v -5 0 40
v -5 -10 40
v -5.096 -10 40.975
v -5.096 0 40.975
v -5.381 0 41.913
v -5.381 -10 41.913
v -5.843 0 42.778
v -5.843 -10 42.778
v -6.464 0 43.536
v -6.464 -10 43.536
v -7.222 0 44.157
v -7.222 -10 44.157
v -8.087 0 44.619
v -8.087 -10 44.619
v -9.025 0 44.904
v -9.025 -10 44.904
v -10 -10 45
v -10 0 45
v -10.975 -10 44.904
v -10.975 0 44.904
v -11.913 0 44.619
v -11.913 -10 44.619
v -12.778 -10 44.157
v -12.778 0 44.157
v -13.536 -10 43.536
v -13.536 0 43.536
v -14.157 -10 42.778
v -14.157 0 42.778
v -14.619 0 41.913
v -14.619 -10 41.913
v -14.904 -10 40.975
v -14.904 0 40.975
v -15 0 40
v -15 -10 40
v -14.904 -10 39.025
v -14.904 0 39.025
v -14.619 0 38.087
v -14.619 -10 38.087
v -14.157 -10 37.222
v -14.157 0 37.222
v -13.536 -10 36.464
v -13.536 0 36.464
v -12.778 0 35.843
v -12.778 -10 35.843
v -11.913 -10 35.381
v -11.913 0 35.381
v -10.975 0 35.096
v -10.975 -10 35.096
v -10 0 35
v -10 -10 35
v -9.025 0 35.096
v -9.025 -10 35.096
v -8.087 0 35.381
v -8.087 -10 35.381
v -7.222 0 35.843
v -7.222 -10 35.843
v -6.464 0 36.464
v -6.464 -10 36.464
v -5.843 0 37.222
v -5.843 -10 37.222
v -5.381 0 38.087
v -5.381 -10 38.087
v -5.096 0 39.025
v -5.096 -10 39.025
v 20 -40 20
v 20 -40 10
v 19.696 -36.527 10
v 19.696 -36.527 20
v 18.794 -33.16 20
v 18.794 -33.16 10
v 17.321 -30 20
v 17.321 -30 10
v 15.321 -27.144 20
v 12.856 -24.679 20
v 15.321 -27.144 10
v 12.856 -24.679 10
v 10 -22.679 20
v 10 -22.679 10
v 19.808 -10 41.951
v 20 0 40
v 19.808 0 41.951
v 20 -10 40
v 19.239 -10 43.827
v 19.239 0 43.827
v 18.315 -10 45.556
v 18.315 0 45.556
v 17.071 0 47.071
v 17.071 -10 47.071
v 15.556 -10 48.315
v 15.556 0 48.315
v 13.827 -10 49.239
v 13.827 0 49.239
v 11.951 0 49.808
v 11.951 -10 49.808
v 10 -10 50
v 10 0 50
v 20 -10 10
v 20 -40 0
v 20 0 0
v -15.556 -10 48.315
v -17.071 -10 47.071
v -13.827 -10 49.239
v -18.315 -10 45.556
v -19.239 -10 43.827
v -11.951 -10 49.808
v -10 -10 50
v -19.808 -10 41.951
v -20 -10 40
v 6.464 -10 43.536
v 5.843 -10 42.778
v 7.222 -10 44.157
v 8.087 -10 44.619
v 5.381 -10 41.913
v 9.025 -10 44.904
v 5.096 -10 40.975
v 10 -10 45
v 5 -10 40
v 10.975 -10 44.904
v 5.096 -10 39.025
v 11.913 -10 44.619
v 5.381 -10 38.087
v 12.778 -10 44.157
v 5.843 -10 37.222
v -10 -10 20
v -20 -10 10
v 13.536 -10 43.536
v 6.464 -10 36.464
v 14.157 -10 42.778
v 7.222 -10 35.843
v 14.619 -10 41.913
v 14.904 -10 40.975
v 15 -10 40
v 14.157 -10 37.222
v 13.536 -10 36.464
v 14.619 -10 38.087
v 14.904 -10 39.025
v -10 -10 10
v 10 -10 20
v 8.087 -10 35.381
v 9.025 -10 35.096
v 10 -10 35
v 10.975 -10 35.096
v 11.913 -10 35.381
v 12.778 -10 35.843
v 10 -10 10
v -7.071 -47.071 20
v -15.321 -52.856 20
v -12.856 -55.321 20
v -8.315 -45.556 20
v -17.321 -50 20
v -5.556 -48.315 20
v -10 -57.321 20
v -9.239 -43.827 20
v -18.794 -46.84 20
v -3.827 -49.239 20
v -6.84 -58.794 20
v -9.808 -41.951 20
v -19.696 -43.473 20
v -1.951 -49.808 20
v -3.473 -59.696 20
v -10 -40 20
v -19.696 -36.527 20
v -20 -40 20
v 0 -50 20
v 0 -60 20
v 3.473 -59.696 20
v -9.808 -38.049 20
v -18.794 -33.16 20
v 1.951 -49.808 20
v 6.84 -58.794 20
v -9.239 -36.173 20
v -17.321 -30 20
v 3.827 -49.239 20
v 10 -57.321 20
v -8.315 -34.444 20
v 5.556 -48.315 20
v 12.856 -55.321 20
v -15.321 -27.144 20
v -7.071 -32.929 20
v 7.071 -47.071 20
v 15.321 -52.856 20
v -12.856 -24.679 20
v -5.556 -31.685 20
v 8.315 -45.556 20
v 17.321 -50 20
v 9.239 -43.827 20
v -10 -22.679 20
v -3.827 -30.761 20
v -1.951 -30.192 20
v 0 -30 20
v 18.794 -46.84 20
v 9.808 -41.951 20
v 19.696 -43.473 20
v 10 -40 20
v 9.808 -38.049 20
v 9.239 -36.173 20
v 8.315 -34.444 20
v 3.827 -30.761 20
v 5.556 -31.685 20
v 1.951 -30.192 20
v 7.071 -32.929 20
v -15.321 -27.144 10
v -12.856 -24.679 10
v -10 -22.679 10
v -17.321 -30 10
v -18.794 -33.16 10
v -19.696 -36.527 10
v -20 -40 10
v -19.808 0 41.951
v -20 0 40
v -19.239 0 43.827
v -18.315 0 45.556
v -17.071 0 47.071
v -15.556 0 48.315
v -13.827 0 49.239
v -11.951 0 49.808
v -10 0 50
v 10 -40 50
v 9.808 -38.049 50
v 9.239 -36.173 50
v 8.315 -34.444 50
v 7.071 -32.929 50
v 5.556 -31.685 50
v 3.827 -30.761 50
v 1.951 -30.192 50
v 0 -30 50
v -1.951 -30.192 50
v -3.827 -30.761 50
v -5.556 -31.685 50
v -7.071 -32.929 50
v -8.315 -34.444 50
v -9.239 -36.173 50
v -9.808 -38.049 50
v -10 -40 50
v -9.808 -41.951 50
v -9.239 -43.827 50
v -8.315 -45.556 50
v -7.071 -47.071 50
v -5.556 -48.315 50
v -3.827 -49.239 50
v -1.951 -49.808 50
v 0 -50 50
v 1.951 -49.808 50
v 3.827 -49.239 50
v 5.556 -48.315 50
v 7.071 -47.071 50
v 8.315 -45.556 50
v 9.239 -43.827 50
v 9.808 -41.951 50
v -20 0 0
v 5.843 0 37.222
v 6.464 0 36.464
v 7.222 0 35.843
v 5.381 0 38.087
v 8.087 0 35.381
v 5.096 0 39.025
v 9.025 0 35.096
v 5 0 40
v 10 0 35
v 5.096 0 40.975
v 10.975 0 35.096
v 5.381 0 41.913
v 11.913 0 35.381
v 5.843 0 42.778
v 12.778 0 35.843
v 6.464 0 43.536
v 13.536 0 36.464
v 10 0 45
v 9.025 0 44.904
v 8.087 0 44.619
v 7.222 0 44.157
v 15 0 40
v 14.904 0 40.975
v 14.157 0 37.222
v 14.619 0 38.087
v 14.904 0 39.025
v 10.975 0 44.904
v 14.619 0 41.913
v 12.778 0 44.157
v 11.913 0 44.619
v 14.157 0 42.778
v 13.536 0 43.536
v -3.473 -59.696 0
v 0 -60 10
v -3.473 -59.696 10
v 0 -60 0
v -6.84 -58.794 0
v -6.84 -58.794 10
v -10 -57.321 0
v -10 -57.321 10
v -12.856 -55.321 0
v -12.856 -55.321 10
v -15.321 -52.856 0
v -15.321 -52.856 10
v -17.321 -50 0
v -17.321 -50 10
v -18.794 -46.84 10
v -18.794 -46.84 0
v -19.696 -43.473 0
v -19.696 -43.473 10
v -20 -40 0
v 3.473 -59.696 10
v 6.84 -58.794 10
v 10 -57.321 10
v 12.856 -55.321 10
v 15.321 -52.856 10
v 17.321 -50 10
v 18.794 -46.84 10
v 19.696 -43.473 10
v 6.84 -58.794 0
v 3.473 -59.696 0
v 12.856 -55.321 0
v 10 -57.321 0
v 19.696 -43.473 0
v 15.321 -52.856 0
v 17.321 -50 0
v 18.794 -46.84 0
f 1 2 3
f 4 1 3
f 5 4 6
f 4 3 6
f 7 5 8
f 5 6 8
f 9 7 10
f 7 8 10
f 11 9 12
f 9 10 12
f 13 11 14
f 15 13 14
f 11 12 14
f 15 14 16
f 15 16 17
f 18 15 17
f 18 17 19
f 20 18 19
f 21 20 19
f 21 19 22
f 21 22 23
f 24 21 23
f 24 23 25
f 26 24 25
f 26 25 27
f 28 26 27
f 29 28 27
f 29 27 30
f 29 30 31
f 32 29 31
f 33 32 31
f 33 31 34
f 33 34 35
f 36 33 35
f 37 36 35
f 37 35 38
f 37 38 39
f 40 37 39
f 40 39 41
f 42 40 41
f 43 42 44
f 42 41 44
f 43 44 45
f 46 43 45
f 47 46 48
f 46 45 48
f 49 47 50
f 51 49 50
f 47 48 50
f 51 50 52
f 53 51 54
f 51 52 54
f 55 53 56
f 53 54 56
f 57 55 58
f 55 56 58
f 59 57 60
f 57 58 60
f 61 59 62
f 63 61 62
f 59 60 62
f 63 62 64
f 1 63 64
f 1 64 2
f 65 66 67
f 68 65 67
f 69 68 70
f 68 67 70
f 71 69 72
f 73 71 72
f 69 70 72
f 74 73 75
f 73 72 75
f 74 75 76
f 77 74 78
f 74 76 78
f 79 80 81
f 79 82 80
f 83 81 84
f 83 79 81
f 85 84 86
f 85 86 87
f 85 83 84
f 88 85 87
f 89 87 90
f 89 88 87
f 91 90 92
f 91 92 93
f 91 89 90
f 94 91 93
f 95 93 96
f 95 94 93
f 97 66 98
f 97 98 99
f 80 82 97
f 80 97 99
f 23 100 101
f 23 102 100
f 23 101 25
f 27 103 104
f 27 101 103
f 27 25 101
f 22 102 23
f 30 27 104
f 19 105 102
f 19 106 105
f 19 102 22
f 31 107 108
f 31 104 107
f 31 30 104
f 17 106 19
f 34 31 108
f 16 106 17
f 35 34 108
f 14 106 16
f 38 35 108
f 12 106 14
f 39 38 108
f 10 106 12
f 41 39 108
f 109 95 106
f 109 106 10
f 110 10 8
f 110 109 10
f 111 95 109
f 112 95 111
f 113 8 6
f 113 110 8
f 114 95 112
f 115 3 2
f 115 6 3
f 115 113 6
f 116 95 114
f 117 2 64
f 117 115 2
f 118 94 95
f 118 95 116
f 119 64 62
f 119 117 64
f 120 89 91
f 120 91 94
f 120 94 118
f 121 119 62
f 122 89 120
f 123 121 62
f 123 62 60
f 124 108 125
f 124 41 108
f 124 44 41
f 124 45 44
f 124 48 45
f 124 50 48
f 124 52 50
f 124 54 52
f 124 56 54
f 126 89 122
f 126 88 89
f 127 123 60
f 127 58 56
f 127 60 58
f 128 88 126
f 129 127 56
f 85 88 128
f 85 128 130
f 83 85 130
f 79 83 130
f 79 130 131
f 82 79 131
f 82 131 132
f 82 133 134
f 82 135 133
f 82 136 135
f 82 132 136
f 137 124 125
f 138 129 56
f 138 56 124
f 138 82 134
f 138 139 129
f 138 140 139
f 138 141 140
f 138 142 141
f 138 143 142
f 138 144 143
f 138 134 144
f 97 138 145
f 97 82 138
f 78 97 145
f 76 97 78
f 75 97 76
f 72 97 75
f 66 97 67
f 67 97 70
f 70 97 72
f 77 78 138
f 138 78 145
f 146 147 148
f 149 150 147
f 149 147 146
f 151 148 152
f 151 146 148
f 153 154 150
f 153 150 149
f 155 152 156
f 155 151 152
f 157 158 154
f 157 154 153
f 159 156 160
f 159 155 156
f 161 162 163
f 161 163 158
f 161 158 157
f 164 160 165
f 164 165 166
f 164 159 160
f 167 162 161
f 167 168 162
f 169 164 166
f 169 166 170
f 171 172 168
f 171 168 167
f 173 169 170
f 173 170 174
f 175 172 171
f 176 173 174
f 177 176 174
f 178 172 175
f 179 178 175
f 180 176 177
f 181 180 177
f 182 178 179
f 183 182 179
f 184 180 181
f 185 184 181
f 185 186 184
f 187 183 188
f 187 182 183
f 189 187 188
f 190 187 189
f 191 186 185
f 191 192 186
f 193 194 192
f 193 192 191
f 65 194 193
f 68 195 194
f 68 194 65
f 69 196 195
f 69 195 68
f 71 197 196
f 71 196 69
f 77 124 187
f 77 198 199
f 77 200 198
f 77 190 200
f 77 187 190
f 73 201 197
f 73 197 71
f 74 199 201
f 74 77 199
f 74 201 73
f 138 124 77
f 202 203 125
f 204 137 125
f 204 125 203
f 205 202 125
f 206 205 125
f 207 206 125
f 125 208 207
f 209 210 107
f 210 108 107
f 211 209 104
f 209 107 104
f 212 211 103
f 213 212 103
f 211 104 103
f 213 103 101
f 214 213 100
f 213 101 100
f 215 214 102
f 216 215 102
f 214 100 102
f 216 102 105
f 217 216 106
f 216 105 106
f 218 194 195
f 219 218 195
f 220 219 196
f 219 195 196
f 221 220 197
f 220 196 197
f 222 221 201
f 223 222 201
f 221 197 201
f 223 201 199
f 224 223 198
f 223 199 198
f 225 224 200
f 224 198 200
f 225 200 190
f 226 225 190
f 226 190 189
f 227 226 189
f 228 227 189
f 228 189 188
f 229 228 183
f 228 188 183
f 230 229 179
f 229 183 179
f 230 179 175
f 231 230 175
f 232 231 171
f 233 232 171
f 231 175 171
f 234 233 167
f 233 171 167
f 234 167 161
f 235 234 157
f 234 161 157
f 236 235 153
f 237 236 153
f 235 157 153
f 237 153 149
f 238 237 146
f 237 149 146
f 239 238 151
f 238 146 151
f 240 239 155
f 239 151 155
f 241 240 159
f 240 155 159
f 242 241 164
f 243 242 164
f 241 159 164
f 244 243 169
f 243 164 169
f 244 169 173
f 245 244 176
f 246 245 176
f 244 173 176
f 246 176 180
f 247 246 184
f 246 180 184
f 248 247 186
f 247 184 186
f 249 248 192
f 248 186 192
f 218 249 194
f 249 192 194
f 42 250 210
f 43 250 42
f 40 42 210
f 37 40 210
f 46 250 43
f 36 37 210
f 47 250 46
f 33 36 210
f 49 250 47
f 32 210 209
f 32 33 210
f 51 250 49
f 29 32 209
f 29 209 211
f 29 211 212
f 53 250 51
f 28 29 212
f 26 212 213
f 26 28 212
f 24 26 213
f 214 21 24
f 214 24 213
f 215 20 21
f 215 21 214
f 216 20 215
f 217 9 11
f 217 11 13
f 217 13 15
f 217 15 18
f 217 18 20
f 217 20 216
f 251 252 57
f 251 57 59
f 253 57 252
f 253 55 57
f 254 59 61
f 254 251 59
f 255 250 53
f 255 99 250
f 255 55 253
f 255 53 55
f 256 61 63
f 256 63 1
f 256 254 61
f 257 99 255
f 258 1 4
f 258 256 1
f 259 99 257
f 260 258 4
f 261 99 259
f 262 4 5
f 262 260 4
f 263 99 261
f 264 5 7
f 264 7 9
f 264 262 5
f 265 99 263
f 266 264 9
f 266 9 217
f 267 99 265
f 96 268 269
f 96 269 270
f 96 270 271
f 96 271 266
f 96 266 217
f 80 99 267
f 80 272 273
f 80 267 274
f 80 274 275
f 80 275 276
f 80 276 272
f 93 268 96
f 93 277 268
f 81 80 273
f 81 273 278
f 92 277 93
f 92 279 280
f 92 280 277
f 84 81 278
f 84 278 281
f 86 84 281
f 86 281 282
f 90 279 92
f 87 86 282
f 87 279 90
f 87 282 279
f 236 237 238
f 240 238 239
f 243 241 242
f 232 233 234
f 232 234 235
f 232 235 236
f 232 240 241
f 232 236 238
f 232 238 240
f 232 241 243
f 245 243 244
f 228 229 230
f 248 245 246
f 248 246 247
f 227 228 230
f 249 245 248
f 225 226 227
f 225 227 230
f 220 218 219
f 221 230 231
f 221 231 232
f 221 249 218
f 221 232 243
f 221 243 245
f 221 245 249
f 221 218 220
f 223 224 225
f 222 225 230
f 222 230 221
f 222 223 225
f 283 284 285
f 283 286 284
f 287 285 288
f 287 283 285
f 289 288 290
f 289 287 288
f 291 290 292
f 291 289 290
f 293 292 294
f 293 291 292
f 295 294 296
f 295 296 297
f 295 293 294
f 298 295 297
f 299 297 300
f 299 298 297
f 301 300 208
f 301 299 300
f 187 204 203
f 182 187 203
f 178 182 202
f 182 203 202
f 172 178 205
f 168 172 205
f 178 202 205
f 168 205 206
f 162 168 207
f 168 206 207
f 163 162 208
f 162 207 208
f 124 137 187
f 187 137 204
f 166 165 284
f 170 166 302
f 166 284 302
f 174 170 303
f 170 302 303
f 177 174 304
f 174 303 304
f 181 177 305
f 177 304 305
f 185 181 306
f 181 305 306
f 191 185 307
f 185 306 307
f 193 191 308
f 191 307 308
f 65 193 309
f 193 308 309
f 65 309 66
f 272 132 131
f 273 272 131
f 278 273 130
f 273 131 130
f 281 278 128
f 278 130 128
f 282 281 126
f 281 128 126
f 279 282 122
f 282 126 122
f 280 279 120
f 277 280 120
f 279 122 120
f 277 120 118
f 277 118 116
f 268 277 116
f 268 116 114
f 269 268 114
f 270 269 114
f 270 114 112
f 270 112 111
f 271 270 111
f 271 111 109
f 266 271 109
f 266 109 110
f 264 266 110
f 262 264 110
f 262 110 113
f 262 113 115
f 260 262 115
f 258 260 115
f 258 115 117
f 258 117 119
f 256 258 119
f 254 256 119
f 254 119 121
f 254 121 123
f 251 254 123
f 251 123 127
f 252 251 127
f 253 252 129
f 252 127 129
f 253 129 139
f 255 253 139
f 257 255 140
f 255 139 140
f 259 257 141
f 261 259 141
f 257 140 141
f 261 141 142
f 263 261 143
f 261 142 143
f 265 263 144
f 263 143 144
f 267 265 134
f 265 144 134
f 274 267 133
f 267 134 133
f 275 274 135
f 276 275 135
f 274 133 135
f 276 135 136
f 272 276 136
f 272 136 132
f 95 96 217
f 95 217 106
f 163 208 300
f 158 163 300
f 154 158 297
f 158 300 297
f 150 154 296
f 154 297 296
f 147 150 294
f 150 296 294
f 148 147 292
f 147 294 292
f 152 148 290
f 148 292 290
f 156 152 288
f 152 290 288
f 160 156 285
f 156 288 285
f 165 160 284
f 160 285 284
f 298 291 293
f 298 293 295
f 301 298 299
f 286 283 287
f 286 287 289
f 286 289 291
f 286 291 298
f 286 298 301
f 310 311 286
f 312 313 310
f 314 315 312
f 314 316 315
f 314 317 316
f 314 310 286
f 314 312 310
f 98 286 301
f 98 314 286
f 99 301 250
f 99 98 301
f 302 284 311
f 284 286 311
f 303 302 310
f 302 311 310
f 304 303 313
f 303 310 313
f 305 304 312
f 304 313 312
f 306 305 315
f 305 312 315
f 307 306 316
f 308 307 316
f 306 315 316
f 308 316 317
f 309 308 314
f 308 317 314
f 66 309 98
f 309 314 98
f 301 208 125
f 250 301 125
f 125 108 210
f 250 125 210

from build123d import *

# Parameters (mm, degrees)
F1_DEPTH = 20
F2_R     = 19.99999
F3_R     = 10
F5_DEPTH = 10
F6_R     = 10
F7_DEPTH = 30
F9_D     = 10
F9_DEPTH = 10.001


# Not quite as in the source:
# - a fillet or chamfer is up to 0.001 mm smaller than in the source, because OpenCascade refuses the exact size


with BuildPart() as f1:
    # F0 (on Right) → F1 (new body, symmetric)
    with BuildSketch(Plane.YZ):
        Polygon((-60, 0), (0, 0), (0, 50), (-10, 50), (-10, 10), (-60, 10), align=None)
    extrude(amount=F1_DEPTH, both=True)

    # F2 (radius 20 in the source; OpenCascade refuses exactly that, so slightly less here)
    f2_edges = [f1.edges().sort_by_distance(p)[0] for p in [
        (-20, -60, 5),
        (20, -60, 5),
    ]]
    fillet(f2_edges, radius=F2_R)

    # F3
    f3_edges = [f1.edges().sort_by_distance(p)[0] for p in [
        (-20, -5, 50),
        (20, -5, 50),
    ]]
    fillet(f3_edges, radius=F3_R)

    # F4 (on face) → F5 (join)
    with BuildSketch(Plane.XY.offset(10)):
        with BuildLine():
            Line((-10, -10), (-10, -22.6794919243))
            ThreePointArc((-10, -22.6794919243), (-17.3205105757, -30.0000043301), (-20, -40.00001))
            ThreePointArc((-20, -40.00001), (-14.1421320882, -54.1421391593), (0, -60))
            ThreePointArc((0, -60), (14.1421320882, -54.1421391593), (20, -40.00001))
            ThreePointArc((20, -40.00001), (17.3205105757, -30.0000043301), (10, -22.6794919243))
            Line((10, -22.6794919243), (10, -10))
            Line((10, -10), (-10, -10))
        make_face()
    extrude(amount=F5_DEPTH)

    # F6 (on face) → F7 (join)
    with BuildSketch(Plane.XY.offset(20)):
        with Locations((0, -40)):
            Circle(F6_R)
    extrude(amount=F7_DEPTH)

    # F9 (through all, one way)
    with BuildSketch(Plane.XZ.offset(10)):
        with Locations((10, 40), (-10, 40)):
            Circle(F9_D / 2)
    extrude(amount=-F9_DEPTH, mode=Mode.SUBTRACT)


solid = f1.part
